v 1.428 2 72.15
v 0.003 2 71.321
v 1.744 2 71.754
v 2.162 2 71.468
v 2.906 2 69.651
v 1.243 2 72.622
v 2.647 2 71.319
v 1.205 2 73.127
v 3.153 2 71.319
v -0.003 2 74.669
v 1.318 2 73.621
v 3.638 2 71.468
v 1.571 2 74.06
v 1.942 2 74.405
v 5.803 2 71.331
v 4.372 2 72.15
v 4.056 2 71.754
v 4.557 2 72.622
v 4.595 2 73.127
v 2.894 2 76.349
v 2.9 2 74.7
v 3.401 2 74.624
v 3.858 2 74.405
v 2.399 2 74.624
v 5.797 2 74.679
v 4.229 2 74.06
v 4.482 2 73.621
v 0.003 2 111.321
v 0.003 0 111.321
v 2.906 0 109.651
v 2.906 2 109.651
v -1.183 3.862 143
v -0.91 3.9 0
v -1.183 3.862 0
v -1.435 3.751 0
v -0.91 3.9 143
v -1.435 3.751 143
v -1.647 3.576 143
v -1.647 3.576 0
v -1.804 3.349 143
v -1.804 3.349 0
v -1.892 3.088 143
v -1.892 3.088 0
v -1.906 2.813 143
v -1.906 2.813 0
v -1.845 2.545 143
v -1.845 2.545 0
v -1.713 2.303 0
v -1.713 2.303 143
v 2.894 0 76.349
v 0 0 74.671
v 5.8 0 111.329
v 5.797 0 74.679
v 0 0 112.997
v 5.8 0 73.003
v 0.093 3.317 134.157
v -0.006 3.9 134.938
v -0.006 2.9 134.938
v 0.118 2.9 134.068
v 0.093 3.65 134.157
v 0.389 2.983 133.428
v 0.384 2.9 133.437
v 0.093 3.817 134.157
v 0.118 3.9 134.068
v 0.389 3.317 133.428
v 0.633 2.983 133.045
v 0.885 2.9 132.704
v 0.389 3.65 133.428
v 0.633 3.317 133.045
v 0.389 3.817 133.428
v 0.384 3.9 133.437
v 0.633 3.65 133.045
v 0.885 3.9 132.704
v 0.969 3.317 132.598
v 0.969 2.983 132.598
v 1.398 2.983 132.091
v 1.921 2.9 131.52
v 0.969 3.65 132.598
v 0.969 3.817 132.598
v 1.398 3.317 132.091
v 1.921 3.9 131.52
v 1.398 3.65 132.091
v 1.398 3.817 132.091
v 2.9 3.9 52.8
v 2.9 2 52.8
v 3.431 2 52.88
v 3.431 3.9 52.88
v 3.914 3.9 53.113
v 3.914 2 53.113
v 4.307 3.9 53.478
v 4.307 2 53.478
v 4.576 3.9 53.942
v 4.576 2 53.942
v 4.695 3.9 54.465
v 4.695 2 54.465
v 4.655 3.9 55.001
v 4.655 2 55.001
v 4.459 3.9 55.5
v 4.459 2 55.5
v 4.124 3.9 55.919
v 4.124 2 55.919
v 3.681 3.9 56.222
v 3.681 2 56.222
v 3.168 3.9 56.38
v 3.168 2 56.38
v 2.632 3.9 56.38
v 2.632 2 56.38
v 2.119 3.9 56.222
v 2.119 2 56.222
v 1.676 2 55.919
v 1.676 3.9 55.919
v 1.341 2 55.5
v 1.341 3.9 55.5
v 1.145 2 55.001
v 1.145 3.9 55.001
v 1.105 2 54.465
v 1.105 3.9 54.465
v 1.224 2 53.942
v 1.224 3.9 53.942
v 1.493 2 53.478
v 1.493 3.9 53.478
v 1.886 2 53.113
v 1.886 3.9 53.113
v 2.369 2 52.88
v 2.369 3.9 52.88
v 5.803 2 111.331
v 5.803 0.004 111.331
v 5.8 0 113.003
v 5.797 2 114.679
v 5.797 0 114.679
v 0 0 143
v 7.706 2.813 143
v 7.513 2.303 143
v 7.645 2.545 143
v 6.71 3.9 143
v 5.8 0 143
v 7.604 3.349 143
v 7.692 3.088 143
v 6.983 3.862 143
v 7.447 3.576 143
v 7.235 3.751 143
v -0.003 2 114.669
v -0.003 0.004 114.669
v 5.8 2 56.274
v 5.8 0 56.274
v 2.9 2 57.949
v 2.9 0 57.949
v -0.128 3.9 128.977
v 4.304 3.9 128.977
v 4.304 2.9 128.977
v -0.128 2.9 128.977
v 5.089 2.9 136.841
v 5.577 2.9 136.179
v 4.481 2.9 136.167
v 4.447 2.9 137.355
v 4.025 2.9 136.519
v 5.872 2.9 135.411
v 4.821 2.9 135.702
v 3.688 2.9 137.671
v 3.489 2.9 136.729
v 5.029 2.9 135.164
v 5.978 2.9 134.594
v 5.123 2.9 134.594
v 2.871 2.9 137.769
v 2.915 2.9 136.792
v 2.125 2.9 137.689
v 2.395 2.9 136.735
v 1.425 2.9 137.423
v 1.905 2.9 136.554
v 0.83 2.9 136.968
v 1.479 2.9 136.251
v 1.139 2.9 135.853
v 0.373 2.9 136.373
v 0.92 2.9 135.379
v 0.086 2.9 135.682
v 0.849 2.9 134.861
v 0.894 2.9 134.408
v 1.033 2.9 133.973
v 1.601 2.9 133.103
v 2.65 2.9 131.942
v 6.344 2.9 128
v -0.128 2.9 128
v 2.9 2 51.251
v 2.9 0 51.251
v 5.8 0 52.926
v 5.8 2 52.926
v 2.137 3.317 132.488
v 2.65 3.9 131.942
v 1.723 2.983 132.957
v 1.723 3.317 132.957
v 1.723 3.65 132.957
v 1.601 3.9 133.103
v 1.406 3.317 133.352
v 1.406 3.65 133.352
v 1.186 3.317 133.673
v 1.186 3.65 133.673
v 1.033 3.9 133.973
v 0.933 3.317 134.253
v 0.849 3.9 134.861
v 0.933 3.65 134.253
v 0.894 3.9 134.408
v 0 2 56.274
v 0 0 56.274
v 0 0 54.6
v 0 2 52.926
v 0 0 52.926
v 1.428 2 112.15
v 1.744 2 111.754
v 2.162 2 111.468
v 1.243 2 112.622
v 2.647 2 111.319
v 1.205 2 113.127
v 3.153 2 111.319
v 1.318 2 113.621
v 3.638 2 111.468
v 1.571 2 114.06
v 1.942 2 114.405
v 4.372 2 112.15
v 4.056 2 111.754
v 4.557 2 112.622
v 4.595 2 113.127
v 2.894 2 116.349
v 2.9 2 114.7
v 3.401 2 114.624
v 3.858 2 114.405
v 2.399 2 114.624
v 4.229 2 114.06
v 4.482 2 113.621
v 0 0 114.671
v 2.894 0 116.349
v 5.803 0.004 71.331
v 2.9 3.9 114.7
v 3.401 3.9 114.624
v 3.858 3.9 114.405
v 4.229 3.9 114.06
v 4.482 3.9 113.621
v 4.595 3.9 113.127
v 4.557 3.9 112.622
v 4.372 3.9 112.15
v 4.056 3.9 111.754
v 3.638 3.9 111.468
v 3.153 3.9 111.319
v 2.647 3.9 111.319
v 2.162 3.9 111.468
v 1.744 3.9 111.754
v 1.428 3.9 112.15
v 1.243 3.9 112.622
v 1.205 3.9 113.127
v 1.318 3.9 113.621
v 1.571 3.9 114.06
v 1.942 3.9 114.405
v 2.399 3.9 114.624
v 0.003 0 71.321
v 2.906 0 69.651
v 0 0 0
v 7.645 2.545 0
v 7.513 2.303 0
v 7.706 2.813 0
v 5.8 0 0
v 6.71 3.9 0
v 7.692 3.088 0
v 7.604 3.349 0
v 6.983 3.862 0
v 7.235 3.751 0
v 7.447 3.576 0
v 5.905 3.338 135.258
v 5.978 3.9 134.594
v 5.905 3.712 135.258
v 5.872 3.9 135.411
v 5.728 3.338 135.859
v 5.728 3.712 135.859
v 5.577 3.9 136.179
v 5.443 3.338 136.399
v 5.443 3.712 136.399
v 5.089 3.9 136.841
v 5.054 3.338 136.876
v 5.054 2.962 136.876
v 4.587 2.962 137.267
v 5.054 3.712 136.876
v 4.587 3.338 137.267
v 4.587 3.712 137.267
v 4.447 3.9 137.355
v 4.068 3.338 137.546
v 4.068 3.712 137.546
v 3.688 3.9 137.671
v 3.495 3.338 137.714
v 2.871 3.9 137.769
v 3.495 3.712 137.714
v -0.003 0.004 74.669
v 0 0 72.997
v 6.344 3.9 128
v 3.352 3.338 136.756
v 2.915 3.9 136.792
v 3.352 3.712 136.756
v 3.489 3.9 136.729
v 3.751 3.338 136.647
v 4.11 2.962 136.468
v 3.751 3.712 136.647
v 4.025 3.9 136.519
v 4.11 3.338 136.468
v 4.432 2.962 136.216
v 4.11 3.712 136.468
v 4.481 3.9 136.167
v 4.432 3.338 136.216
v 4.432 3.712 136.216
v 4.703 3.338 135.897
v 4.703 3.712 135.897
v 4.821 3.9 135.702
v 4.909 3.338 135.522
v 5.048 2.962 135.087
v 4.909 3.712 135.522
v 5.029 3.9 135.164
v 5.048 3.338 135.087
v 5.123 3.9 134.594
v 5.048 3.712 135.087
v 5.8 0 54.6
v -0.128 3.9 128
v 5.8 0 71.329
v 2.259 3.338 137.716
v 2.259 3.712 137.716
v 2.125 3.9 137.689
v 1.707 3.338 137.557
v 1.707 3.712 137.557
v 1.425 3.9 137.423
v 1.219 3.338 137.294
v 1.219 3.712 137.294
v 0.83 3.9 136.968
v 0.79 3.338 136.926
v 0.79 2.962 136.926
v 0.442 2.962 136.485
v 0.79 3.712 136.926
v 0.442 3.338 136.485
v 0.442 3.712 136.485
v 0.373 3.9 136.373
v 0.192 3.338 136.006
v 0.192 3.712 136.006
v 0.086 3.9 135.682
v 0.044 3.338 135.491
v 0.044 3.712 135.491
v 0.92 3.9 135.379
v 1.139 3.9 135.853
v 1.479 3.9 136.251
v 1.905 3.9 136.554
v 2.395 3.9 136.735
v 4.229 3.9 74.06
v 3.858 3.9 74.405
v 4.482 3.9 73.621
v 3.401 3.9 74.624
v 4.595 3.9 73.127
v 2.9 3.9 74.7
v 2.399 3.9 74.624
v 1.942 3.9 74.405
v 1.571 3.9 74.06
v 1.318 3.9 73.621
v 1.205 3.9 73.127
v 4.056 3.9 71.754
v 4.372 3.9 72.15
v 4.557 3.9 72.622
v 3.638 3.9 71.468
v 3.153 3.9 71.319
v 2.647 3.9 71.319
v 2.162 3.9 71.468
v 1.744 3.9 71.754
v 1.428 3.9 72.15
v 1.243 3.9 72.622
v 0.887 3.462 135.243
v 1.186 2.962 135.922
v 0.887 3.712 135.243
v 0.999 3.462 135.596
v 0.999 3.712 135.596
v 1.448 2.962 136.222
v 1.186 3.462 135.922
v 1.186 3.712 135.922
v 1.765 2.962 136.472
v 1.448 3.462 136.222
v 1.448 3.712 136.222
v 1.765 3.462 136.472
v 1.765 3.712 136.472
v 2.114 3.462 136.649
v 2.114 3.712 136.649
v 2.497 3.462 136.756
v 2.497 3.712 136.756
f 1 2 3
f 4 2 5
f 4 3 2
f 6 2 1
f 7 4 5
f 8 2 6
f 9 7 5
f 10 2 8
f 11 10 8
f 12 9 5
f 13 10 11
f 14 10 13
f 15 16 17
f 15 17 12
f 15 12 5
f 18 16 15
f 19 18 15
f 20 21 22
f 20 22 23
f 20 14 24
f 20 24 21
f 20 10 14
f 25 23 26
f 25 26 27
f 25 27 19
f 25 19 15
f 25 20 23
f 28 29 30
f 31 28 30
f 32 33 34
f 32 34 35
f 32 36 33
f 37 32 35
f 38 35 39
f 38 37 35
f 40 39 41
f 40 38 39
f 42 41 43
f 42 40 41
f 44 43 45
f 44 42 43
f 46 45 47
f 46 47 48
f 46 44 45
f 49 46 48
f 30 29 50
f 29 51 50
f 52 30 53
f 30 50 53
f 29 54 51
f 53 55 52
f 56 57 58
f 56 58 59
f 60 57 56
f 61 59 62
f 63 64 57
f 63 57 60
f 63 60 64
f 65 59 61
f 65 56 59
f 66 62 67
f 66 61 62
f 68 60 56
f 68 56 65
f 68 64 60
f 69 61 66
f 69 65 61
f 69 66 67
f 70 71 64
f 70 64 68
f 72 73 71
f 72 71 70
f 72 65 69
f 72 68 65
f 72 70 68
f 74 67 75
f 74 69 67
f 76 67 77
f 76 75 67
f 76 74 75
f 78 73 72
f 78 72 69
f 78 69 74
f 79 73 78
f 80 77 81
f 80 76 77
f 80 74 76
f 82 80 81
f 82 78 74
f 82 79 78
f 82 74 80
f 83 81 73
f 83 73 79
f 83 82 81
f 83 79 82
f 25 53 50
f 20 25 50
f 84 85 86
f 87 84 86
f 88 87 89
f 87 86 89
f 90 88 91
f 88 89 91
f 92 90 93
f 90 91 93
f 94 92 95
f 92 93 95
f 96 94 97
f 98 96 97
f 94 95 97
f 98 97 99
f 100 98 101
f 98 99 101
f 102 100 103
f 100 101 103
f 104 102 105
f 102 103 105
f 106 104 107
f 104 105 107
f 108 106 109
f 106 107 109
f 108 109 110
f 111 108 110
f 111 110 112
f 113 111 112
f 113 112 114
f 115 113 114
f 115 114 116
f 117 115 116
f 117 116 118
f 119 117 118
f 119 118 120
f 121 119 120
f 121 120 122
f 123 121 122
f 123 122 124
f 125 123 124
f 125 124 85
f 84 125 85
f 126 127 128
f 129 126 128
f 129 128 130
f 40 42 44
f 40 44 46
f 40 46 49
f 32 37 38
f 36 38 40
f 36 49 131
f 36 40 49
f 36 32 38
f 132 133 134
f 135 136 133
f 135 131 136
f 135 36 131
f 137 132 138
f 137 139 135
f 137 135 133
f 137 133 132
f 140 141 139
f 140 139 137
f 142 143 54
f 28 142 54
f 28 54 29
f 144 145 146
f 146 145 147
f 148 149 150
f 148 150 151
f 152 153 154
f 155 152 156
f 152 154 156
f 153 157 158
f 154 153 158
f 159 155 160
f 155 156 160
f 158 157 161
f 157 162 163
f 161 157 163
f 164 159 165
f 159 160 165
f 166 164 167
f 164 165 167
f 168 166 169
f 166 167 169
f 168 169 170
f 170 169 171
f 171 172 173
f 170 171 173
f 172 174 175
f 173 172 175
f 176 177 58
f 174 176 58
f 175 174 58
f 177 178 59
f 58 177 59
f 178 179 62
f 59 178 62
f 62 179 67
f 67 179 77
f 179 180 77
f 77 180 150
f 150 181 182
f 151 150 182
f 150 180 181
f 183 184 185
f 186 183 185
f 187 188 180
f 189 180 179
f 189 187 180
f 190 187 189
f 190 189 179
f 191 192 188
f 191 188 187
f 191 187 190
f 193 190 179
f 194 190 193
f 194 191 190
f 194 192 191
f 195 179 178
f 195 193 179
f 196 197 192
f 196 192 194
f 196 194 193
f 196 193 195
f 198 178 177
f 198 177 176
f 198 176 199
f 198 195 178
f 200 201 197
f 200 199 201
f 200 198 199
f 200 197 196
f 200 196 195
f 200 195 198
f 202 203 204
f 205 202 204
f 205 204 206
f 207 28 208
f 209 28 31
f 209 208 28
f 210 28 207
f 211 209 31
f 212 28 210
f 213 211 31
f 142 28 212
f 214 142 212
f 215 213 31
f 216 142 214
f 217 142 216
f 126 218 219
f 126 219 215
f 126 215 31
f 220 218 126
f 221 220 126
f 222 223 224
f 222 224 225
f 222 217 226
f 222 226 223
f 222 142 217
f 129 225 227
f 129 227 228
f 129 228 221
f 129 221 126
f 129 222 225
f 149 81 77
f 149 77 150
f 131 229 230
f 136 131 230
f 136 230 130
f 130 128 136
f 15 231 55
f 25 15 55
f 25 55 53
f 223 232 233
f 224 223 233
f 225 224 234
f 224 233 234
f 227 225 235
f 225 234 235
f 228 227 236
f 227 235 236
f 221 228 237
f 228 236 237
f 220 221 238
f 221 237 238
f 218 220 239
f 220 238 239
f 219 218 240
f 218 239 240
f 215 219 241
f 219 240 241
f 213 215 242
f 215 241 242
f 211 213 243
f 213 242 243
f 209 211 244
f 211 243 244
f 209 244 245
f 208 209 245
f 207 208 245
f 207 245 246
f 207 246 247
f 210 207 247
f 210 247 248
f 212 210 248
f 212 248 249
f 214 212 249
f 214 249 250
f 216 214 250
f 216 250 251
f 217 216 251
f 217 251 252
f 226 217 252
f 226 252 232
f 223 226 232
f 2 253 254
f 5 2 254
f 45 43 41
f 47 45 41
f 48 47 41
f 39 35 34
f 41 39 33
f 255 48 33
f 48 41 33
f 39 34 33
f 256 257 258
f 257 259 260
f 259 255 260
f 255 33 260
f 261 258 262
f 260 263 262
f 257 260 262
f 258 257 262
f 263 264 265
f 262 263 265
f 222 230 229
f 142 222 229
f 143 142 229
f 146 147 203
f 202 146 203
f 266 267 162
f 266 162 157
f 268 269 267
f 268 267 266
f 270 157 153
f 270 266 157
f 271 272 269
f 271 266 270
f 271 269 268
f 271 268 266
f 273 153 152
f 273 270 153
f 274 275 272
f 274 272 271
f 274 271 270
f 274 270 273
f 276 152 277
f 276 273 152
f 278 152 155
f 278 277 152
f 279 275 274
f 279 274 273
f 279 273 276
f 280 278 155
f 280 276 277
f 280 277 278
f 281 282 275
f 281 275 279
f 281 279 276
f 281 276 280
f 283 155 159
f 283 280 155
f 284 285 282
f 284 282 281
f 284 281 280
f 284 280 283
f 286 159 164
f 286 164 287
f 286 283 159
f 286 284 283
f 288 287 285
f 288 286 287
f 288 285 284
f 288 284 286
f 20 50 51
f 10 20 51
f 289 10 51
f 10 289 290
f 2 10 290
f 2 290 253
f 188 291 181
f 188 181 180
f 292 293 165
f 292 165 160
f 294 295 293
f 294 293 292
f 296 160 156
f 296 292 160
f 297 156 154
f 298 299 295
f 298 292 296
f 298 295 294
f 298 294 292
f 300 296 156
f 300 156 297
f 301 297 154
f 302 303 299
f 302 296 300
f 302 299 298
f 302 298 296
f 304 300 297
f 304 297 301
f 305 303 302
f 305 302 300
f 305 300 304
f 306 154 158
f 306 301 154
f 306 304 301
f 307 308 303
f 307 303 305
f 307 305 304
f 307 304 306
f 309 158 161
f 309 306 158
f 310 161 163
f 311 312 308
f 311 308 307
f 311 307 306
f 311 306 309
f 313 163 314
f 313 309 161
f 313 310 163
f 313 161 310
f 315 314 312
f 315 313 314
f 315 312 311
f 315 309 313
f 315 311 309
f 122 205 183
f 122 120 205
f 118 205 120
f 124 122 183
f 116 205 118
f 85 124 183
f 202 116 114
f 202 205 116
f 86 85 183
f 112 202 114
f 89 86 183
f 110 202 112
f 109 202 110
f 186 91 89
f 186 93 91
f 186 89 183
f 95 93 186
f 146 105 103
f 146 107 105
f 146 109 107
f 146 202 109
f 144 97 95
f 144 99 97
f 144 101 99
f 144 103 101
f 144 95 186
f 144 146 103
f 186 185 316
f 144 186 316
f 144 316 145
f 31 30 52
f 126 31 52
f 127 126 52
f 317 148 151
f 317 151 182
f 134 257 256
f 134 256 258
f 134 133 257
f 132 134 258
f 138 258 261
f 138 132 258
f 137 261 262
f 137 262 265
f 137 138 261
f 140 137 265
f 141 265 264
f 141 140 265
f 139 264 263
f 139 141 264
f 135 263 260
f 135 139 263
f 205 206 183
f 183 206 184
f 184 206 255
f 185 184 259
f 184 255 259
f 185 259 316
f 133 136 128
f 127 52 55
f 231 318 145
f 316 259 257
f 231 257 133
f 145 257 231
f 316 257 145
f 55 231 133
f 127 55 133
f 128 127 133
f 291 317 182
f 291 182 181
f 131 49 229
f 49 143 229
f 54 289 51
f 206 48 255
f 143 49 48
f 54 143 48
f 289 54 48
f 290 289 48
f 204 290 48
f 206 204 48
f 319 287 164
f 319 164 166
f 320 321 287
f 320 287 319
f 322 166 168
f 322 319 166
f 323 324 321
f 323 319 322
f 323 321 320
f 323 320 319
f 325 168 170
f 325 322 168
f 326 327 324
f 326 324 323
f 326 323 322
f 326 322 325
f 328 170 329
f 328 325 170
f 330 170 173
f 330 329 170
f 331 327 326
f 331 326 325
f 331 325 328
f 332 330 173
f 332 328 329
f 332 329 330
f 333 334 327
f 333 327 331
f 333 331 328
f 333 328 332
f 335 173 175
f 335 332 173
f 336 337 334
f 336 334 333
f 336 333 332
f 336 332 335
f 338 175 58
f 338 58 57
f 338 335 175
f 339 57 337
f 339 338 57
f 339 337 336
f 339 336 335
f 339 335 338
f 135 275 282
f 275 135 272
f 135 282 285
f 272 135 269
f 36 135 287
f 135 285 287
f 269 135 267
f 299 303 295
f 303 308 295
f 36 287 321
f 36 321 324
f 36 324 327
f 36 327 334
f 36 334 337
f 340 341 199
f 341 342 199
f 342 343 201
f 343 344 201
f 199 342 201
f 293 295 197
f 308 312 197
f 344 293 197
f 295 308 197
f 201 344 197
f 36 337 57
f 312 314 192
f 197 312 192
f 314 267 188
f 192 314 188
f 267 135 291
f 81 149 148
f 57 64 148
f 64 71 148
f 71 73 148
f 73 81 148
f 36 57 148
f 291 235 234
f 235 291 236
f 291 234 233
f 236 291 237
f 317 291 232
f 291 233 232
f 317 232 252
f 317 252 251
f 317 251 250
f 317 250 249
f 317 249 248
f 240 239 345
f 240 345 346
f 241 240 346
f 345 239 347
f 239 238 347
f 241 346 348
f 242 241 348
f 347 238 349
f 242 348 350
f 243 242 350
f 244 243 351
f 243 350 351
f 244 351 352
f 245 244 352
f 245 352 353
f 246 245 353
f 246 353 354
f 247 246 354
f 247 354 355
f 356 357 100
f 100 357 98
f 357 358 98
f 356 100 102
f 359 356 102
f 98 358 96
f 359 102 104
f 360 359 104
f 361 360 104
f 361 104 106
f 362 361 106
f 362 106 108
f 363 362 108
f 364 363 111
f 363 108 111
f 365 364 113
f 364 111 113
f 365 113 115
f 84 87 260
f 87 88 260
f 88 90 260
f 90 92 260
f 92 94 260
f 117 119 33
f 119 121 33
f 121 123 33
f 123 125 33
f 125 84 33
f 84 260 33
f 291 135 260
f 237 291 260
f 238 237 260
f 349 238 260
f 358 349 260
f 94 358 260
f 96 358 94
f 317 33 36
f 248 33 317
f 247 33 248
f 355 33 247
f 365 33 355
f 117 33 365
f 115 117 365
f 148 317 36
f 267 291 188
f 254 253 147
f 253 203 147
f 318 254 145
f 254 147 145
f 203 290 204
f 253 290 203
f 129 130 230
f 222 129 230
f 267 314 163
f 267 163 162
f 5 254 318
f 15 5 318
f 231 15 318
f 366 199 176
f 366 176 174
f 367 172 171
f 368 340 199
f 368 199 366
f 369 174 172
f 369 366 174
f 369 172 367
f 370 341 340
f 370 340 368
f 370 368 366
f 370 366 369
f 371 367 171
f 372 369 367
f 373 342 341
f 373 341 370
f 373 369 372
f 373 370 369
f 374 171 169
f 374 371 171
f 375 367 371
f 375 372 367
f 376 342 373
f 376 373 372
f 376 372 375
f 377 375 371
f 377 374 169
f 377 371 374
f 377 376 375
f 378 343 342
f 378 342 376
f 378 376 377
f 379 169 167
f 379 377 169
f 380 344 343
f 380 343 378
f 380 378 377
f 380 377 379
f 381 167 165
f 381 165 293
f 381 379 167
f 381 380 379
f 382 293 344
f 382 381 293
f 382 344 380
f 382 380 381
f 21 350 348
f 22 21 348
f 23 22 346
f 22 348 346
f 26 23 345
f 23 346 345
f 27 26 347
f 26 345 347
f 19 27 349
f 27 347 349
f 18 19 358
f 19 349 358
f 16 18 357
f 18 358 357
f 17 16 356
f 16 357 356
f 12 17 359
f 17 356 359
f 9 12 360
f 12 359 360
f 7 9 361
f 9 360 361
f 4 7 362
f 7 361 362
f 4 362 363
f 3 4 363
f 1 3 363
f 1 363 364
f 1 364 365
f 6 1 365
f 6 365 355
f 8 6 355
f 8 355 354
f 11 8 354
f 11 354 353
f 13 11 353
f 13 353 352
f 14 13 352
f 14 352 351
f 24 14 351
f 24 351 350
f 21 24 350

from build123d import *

# Parameters (mm, degrees)
BOSS_EXTRUDE1_DEPTH = 143
FILLET1_R           = 1
SKETCH2_R           = 1.8
CUT_EXTRUDE1_DEPTH  = 200
CUT_EXTRUDE2_DEPTH  = 2
CUT_EXTRUDE3_DEPTH  = 1
SKETCH5_R           = 1.7
CUT_EXTRUDE4_DEPTH  = 10
LPATTERN1_COUNT     = 2
LPATTERN1_PITCH     = 40
CUT_EXTRUDE5_DEPTH  = 2


with BuildPart() as part:
    # Sketch1 → Boss-Extrude1 (new body)
    with BuildSketch(Plane.XY):
        Polygon((0, 0), (5.8, 0), (8.7, 3.9), (-2.9, 3.9), align=None)
    extrude(amount=BOSS_EXTRUDE1_DEPTH)

    # Fillet1
    fillet1_edges = [part.edges().sort_by_distance(p)[0] for p in [
        (-2.9, 3.9, 71.5),
        (8.7, 3.9, 71.5),
    ]]
    fillet(fillet1_edges, radius=FILLET1_R)

    # Sketch2 → Cut-Extrude1 (cut)
    with BuildSketch(Plane.XZ):
        with Locations(Location((2.9, 54.6, 0), (0, 0, 270))):
            Circle(SKETCH2_R)
    extrude(amount=-CUT_EXTRUDE1_DEPTH, mode=Mode.SUBTRACT)

    # Sketch3 → Cut-Extrude2 (cut)
    with BuildSketch(Plane.XZ):
        Polygon((2.90000734, 57.948631561), (3.67e-06, 56.274322137), (-3.67e-06, 52.925690576), (2.89999266, 51.251368439), (5.79999633, 52.925677863), (5.80000367, 56.274309424), align=None)
    extrude(amount=-CUT_EXTRUDE2_DEPTH, mode=Mode.SUBTRACT)

    # Sketch4 → Cut-Extrude3 (cut)
    with BuildSketch(Plane(origin=(0, 3.9, 0), x_dir=(1, 0, 0), z_dir=(0, 1, 0))):
        with BuildLine():
            Line((5.122745858, -134.594230769), (5.977553551, -134.594230769))
            add(Edge.make_bspline(
                [(5.977553551, -134.594230769), (5.971983318, -134.707635673), (5.96104353, -134.930359885), (5.909790268, -135.255083464), (5.836521158, -135.565504079), (5.732681737, -135.858960447), (5.604449126, -136.138958148), (5.447455301, -136.401779138), (5.265047116, -136.650031883), (5.057559206, -136.879016136), (4.832415701, -137.088336373), (4.59096556, -137.271007952), (4.335690435, -137.423581719), (4.068804473, -137.551823488), (3.787221058, -137.647967628), (3.493631813, -137.719336337), (3.186709745, -137.762268246), (2.977595349, -137.766883522), (2.871243455, -137.769230769)],
                knots=[0, 0, 0, 0, 1.100776268, 2.161895295, 3.184016182, 4.190939212, 5.176500551, 6.166955529, 7.155448256, 8.160289653, 9.16017456, 10.133824356, 11.091467644, 12.04088621, 13.000931625, 13.972173743, 14.968683325, 16, 16, 16, 16], degree=3))
            add(Edge.make_bspline(
                [(2.871243455, -137.769230769), (2.766792917, -137.766805526), (2.561551342, -137.76204001), (2.26212941, -137.720499656), (1.976409076, -137.656842765), (1.707628406, -137.56251328), (1.453028956, -137.444150411), (1.215763088, -137.296950676), (0.990093468, -137.127879071), (0.787095567, -136.928450822), (0.600617505, -136.715660377), (0.43988469, -136.488401971), (0.301460326, -136.253409781), (0.188164307, -136.008848177), (0.102280887, -135.753920747), (0.038649503, -135.491071568), (0.002274366, -135.217267183), (-0.003277626, -135.031914725), (-0.006100295, -134.937680288)],
                knots=[0, 0, 0, 0, 1.111674182, 2.184400057, 3.212814286, 4.223731311, 5.211378316, 6.196328225, 7.191884489, 8.207283132, 9.220262353, 10.201199469, 11.166417575, 12.120932471, 13.06540007, 14.026332106, 14.996573967, 16, 16, 16, 16], degree=3))
            add(Edge.make_bspline(
                [(-0.006100295, -134.937680288), (-0.001492129, -134.805016596), (0.007643337, -134.54201727), (0.0857864, -134.155533128), (0.207837017, -133.781085653), (0.354773944, -133.479711723), (0.503045957, -133.236892134), (0.63652693, -133.036867771), (0.79367716, -132.821551985), (0.973154024, -132.590073288), (1.178048369, -132.345463088), (1.403037067, -132.082730681), (1.653930529, -131.806734169), (1.829867162, -131.618102024), (1.921033118, -131.520357572)],
                knots=[0, 0, 0, 0, 1.184416499, 2.348048165, 3.509039915, 4.696071444, 5.333504901, 6.05069495, 6.844171097, 7.714965912, 8.667477798, 9.695072654, 10.805644396, 12, 12, 12, 12], degree=3))
            Line((1.921033118, -131.520357572), (4.304191171, -128.976923077))
            Line((4.304191171, -128.976923077), (-0.12821568, -128.976923077))
            Line((-0.12821568, -128.976923077), (-0.12821568, -128))
            Line((-0.12821568, -128), (6.343899705, -128))
            Line((6.343899705, -128), (2.64990932, -131.94203726))
            add(Edge.make_bspline(
                [(2.64990932, -131.94203726), (2.559965489, -132.035916816), (2.387201798, -132.216240231), (2.142948702, -132.479586657), (1.923217267, -132.723609906), (1.727861736, -132.949391305), (1.55672137, -133.155650884), (1.410343741, -133.344005051), (1.288081888, -133.512837404), (1.158509801, -133.711174594), (1.034954218, -133.953619944), (0.926361503, -134.248410515), (0.860620951, -134.552545379), (0.85269448, -134.758008475), (0.848707397, -134.861358173)],
                knots=[0, 0, 0, 0, 1.329530082, 2.553755191, 3.672934919, 4.687409497, 5.60679272, 6.413407421, 7.126401618, 7.737995624, 8.834647426, 9.90044882, 10.943907757, 12, 12, 12, 12], degree=3))
            add(Edge.make_bspline(
                [(0.848707397, -134.861358173), (0.850419752, -134.926356875), (0.853794476, -135.054456835), (0.884142204, -135.242148032), (0.928729039, -135.423900083), (0.997451125, -135.597465755), (1.080018182, -135.766258747), (1.185503685, -135.925147228), (1.306045915, -136.079547323), (1.445868989, -136.224164782), (1.599368744, -136.356656831), (1.761555505, -136.474013435), (1.933140485, -136.572091957), (2.113408614, -136.652492299), (2.301855113, -136.715562491), (2.498845054, -136.759264755), (2.703833976, -136.786703519), (2.843806562, -136.790416014), (2.915128671, -136.792307692)],
                knots=[0, 0, 0, 0, 0.991504627, 1.954065223, 2.895985987, 3.842598665, 4.797835564, 5.759220273, 6.74786863, 7.784730864, 8.824135544, 9.839918996, 10.835834653, 11.835434876, 12.84861661, 13.863796685, 14.911511676, 16, 16, 16, 16], degree=3))
            add(Edge.make_bspline(
                [(2.915128671, -136.792307692), (2.989635464, -136.790439156), (3.135954505, -136.786769659), (3.350321609, -136.758957907), (3.556252164, -136.716838427), (3.750572839, -136.649784559), (3.937350419, -136.571306767), (4.111820115, -136.469691831), (4.278882998, -136.353581052), (4.435180219, -136.218203259), (4.577533213, -136.065382121), (4.707033005, -135.899039013), (4.816759463, -135.716225009), (4.914162533, -135.521326783), (4.988656651, -135.308989677), (5.052343784, -135.084406654), (5.098605194, -134.844373441), (5.11456532, -134.678996532), (5.122745858, -134.594230769)],
                knots=[0, 0, 0, 0, 1.031072318, 2.024855787, 2.988461151, 3.935103592, 4.865765533, 5.788564469, 6.724086513, 7.67908574, 8.64457978, 9.611397706, 10.591395687, 11.591555111, 12.622101007, 13.700900657, 14.821571223, 16, 16, 16, 16], degree=3))
        make_face()
    extrude(amount=-CUT_EXTRUDE3_DEPTH, mode=Mode.SUBTRACT)

    # Sketch5 → Cut-Extrude4 (cut)
    with BuildSketch(Plane(origin=(0, 3.9, 0), x_dir=(1, 0, 0), z_dir=(0, 1, 0))):
        with Locations(Location((2.9, -113, 0), (0, 0, 270))):
            Circle(SKETCH5_R)
    cut_extrude4 = extrude(amount=-CUT_EXTRUDE4_DEPTH, mode=Mode.SUBTRACT)

    # LPattern1: Cut-Extrude4 ×2
    with Locations(*[(0, 0, -i * LPATTERN1_PITCH) for i in range(1, LPATTERN1_COUNT)]):
        add(cut_extrude4, mode=Mode.SUBTRACT)

    # Sketch6 → Cut-Extrude5 (cut)
    with BuildSketch(Plane.XZ):
        Polygon((5.797077148, 114.679368135), (2.894163107, 116.348626474), (-0.002914041, 114.669258339), (0.002922852, 111.320631865), (2.905836893, 109.651373526), (5.802914041, 111.330741661), align=None)
        Polygon((5.797077148, 74.679368135), (2.894163107, 76.348626474), (-0.002914041, 74.669258339), (0.002922852, 71.320631865), (2.905836893, 69.651373526), (5.802914041, 71.330741661), align=None)
    extrude(amount=-CUT_EXTRUDE5_DEPTH, mode=Mode.SUBTRACT)


solid = part.part
